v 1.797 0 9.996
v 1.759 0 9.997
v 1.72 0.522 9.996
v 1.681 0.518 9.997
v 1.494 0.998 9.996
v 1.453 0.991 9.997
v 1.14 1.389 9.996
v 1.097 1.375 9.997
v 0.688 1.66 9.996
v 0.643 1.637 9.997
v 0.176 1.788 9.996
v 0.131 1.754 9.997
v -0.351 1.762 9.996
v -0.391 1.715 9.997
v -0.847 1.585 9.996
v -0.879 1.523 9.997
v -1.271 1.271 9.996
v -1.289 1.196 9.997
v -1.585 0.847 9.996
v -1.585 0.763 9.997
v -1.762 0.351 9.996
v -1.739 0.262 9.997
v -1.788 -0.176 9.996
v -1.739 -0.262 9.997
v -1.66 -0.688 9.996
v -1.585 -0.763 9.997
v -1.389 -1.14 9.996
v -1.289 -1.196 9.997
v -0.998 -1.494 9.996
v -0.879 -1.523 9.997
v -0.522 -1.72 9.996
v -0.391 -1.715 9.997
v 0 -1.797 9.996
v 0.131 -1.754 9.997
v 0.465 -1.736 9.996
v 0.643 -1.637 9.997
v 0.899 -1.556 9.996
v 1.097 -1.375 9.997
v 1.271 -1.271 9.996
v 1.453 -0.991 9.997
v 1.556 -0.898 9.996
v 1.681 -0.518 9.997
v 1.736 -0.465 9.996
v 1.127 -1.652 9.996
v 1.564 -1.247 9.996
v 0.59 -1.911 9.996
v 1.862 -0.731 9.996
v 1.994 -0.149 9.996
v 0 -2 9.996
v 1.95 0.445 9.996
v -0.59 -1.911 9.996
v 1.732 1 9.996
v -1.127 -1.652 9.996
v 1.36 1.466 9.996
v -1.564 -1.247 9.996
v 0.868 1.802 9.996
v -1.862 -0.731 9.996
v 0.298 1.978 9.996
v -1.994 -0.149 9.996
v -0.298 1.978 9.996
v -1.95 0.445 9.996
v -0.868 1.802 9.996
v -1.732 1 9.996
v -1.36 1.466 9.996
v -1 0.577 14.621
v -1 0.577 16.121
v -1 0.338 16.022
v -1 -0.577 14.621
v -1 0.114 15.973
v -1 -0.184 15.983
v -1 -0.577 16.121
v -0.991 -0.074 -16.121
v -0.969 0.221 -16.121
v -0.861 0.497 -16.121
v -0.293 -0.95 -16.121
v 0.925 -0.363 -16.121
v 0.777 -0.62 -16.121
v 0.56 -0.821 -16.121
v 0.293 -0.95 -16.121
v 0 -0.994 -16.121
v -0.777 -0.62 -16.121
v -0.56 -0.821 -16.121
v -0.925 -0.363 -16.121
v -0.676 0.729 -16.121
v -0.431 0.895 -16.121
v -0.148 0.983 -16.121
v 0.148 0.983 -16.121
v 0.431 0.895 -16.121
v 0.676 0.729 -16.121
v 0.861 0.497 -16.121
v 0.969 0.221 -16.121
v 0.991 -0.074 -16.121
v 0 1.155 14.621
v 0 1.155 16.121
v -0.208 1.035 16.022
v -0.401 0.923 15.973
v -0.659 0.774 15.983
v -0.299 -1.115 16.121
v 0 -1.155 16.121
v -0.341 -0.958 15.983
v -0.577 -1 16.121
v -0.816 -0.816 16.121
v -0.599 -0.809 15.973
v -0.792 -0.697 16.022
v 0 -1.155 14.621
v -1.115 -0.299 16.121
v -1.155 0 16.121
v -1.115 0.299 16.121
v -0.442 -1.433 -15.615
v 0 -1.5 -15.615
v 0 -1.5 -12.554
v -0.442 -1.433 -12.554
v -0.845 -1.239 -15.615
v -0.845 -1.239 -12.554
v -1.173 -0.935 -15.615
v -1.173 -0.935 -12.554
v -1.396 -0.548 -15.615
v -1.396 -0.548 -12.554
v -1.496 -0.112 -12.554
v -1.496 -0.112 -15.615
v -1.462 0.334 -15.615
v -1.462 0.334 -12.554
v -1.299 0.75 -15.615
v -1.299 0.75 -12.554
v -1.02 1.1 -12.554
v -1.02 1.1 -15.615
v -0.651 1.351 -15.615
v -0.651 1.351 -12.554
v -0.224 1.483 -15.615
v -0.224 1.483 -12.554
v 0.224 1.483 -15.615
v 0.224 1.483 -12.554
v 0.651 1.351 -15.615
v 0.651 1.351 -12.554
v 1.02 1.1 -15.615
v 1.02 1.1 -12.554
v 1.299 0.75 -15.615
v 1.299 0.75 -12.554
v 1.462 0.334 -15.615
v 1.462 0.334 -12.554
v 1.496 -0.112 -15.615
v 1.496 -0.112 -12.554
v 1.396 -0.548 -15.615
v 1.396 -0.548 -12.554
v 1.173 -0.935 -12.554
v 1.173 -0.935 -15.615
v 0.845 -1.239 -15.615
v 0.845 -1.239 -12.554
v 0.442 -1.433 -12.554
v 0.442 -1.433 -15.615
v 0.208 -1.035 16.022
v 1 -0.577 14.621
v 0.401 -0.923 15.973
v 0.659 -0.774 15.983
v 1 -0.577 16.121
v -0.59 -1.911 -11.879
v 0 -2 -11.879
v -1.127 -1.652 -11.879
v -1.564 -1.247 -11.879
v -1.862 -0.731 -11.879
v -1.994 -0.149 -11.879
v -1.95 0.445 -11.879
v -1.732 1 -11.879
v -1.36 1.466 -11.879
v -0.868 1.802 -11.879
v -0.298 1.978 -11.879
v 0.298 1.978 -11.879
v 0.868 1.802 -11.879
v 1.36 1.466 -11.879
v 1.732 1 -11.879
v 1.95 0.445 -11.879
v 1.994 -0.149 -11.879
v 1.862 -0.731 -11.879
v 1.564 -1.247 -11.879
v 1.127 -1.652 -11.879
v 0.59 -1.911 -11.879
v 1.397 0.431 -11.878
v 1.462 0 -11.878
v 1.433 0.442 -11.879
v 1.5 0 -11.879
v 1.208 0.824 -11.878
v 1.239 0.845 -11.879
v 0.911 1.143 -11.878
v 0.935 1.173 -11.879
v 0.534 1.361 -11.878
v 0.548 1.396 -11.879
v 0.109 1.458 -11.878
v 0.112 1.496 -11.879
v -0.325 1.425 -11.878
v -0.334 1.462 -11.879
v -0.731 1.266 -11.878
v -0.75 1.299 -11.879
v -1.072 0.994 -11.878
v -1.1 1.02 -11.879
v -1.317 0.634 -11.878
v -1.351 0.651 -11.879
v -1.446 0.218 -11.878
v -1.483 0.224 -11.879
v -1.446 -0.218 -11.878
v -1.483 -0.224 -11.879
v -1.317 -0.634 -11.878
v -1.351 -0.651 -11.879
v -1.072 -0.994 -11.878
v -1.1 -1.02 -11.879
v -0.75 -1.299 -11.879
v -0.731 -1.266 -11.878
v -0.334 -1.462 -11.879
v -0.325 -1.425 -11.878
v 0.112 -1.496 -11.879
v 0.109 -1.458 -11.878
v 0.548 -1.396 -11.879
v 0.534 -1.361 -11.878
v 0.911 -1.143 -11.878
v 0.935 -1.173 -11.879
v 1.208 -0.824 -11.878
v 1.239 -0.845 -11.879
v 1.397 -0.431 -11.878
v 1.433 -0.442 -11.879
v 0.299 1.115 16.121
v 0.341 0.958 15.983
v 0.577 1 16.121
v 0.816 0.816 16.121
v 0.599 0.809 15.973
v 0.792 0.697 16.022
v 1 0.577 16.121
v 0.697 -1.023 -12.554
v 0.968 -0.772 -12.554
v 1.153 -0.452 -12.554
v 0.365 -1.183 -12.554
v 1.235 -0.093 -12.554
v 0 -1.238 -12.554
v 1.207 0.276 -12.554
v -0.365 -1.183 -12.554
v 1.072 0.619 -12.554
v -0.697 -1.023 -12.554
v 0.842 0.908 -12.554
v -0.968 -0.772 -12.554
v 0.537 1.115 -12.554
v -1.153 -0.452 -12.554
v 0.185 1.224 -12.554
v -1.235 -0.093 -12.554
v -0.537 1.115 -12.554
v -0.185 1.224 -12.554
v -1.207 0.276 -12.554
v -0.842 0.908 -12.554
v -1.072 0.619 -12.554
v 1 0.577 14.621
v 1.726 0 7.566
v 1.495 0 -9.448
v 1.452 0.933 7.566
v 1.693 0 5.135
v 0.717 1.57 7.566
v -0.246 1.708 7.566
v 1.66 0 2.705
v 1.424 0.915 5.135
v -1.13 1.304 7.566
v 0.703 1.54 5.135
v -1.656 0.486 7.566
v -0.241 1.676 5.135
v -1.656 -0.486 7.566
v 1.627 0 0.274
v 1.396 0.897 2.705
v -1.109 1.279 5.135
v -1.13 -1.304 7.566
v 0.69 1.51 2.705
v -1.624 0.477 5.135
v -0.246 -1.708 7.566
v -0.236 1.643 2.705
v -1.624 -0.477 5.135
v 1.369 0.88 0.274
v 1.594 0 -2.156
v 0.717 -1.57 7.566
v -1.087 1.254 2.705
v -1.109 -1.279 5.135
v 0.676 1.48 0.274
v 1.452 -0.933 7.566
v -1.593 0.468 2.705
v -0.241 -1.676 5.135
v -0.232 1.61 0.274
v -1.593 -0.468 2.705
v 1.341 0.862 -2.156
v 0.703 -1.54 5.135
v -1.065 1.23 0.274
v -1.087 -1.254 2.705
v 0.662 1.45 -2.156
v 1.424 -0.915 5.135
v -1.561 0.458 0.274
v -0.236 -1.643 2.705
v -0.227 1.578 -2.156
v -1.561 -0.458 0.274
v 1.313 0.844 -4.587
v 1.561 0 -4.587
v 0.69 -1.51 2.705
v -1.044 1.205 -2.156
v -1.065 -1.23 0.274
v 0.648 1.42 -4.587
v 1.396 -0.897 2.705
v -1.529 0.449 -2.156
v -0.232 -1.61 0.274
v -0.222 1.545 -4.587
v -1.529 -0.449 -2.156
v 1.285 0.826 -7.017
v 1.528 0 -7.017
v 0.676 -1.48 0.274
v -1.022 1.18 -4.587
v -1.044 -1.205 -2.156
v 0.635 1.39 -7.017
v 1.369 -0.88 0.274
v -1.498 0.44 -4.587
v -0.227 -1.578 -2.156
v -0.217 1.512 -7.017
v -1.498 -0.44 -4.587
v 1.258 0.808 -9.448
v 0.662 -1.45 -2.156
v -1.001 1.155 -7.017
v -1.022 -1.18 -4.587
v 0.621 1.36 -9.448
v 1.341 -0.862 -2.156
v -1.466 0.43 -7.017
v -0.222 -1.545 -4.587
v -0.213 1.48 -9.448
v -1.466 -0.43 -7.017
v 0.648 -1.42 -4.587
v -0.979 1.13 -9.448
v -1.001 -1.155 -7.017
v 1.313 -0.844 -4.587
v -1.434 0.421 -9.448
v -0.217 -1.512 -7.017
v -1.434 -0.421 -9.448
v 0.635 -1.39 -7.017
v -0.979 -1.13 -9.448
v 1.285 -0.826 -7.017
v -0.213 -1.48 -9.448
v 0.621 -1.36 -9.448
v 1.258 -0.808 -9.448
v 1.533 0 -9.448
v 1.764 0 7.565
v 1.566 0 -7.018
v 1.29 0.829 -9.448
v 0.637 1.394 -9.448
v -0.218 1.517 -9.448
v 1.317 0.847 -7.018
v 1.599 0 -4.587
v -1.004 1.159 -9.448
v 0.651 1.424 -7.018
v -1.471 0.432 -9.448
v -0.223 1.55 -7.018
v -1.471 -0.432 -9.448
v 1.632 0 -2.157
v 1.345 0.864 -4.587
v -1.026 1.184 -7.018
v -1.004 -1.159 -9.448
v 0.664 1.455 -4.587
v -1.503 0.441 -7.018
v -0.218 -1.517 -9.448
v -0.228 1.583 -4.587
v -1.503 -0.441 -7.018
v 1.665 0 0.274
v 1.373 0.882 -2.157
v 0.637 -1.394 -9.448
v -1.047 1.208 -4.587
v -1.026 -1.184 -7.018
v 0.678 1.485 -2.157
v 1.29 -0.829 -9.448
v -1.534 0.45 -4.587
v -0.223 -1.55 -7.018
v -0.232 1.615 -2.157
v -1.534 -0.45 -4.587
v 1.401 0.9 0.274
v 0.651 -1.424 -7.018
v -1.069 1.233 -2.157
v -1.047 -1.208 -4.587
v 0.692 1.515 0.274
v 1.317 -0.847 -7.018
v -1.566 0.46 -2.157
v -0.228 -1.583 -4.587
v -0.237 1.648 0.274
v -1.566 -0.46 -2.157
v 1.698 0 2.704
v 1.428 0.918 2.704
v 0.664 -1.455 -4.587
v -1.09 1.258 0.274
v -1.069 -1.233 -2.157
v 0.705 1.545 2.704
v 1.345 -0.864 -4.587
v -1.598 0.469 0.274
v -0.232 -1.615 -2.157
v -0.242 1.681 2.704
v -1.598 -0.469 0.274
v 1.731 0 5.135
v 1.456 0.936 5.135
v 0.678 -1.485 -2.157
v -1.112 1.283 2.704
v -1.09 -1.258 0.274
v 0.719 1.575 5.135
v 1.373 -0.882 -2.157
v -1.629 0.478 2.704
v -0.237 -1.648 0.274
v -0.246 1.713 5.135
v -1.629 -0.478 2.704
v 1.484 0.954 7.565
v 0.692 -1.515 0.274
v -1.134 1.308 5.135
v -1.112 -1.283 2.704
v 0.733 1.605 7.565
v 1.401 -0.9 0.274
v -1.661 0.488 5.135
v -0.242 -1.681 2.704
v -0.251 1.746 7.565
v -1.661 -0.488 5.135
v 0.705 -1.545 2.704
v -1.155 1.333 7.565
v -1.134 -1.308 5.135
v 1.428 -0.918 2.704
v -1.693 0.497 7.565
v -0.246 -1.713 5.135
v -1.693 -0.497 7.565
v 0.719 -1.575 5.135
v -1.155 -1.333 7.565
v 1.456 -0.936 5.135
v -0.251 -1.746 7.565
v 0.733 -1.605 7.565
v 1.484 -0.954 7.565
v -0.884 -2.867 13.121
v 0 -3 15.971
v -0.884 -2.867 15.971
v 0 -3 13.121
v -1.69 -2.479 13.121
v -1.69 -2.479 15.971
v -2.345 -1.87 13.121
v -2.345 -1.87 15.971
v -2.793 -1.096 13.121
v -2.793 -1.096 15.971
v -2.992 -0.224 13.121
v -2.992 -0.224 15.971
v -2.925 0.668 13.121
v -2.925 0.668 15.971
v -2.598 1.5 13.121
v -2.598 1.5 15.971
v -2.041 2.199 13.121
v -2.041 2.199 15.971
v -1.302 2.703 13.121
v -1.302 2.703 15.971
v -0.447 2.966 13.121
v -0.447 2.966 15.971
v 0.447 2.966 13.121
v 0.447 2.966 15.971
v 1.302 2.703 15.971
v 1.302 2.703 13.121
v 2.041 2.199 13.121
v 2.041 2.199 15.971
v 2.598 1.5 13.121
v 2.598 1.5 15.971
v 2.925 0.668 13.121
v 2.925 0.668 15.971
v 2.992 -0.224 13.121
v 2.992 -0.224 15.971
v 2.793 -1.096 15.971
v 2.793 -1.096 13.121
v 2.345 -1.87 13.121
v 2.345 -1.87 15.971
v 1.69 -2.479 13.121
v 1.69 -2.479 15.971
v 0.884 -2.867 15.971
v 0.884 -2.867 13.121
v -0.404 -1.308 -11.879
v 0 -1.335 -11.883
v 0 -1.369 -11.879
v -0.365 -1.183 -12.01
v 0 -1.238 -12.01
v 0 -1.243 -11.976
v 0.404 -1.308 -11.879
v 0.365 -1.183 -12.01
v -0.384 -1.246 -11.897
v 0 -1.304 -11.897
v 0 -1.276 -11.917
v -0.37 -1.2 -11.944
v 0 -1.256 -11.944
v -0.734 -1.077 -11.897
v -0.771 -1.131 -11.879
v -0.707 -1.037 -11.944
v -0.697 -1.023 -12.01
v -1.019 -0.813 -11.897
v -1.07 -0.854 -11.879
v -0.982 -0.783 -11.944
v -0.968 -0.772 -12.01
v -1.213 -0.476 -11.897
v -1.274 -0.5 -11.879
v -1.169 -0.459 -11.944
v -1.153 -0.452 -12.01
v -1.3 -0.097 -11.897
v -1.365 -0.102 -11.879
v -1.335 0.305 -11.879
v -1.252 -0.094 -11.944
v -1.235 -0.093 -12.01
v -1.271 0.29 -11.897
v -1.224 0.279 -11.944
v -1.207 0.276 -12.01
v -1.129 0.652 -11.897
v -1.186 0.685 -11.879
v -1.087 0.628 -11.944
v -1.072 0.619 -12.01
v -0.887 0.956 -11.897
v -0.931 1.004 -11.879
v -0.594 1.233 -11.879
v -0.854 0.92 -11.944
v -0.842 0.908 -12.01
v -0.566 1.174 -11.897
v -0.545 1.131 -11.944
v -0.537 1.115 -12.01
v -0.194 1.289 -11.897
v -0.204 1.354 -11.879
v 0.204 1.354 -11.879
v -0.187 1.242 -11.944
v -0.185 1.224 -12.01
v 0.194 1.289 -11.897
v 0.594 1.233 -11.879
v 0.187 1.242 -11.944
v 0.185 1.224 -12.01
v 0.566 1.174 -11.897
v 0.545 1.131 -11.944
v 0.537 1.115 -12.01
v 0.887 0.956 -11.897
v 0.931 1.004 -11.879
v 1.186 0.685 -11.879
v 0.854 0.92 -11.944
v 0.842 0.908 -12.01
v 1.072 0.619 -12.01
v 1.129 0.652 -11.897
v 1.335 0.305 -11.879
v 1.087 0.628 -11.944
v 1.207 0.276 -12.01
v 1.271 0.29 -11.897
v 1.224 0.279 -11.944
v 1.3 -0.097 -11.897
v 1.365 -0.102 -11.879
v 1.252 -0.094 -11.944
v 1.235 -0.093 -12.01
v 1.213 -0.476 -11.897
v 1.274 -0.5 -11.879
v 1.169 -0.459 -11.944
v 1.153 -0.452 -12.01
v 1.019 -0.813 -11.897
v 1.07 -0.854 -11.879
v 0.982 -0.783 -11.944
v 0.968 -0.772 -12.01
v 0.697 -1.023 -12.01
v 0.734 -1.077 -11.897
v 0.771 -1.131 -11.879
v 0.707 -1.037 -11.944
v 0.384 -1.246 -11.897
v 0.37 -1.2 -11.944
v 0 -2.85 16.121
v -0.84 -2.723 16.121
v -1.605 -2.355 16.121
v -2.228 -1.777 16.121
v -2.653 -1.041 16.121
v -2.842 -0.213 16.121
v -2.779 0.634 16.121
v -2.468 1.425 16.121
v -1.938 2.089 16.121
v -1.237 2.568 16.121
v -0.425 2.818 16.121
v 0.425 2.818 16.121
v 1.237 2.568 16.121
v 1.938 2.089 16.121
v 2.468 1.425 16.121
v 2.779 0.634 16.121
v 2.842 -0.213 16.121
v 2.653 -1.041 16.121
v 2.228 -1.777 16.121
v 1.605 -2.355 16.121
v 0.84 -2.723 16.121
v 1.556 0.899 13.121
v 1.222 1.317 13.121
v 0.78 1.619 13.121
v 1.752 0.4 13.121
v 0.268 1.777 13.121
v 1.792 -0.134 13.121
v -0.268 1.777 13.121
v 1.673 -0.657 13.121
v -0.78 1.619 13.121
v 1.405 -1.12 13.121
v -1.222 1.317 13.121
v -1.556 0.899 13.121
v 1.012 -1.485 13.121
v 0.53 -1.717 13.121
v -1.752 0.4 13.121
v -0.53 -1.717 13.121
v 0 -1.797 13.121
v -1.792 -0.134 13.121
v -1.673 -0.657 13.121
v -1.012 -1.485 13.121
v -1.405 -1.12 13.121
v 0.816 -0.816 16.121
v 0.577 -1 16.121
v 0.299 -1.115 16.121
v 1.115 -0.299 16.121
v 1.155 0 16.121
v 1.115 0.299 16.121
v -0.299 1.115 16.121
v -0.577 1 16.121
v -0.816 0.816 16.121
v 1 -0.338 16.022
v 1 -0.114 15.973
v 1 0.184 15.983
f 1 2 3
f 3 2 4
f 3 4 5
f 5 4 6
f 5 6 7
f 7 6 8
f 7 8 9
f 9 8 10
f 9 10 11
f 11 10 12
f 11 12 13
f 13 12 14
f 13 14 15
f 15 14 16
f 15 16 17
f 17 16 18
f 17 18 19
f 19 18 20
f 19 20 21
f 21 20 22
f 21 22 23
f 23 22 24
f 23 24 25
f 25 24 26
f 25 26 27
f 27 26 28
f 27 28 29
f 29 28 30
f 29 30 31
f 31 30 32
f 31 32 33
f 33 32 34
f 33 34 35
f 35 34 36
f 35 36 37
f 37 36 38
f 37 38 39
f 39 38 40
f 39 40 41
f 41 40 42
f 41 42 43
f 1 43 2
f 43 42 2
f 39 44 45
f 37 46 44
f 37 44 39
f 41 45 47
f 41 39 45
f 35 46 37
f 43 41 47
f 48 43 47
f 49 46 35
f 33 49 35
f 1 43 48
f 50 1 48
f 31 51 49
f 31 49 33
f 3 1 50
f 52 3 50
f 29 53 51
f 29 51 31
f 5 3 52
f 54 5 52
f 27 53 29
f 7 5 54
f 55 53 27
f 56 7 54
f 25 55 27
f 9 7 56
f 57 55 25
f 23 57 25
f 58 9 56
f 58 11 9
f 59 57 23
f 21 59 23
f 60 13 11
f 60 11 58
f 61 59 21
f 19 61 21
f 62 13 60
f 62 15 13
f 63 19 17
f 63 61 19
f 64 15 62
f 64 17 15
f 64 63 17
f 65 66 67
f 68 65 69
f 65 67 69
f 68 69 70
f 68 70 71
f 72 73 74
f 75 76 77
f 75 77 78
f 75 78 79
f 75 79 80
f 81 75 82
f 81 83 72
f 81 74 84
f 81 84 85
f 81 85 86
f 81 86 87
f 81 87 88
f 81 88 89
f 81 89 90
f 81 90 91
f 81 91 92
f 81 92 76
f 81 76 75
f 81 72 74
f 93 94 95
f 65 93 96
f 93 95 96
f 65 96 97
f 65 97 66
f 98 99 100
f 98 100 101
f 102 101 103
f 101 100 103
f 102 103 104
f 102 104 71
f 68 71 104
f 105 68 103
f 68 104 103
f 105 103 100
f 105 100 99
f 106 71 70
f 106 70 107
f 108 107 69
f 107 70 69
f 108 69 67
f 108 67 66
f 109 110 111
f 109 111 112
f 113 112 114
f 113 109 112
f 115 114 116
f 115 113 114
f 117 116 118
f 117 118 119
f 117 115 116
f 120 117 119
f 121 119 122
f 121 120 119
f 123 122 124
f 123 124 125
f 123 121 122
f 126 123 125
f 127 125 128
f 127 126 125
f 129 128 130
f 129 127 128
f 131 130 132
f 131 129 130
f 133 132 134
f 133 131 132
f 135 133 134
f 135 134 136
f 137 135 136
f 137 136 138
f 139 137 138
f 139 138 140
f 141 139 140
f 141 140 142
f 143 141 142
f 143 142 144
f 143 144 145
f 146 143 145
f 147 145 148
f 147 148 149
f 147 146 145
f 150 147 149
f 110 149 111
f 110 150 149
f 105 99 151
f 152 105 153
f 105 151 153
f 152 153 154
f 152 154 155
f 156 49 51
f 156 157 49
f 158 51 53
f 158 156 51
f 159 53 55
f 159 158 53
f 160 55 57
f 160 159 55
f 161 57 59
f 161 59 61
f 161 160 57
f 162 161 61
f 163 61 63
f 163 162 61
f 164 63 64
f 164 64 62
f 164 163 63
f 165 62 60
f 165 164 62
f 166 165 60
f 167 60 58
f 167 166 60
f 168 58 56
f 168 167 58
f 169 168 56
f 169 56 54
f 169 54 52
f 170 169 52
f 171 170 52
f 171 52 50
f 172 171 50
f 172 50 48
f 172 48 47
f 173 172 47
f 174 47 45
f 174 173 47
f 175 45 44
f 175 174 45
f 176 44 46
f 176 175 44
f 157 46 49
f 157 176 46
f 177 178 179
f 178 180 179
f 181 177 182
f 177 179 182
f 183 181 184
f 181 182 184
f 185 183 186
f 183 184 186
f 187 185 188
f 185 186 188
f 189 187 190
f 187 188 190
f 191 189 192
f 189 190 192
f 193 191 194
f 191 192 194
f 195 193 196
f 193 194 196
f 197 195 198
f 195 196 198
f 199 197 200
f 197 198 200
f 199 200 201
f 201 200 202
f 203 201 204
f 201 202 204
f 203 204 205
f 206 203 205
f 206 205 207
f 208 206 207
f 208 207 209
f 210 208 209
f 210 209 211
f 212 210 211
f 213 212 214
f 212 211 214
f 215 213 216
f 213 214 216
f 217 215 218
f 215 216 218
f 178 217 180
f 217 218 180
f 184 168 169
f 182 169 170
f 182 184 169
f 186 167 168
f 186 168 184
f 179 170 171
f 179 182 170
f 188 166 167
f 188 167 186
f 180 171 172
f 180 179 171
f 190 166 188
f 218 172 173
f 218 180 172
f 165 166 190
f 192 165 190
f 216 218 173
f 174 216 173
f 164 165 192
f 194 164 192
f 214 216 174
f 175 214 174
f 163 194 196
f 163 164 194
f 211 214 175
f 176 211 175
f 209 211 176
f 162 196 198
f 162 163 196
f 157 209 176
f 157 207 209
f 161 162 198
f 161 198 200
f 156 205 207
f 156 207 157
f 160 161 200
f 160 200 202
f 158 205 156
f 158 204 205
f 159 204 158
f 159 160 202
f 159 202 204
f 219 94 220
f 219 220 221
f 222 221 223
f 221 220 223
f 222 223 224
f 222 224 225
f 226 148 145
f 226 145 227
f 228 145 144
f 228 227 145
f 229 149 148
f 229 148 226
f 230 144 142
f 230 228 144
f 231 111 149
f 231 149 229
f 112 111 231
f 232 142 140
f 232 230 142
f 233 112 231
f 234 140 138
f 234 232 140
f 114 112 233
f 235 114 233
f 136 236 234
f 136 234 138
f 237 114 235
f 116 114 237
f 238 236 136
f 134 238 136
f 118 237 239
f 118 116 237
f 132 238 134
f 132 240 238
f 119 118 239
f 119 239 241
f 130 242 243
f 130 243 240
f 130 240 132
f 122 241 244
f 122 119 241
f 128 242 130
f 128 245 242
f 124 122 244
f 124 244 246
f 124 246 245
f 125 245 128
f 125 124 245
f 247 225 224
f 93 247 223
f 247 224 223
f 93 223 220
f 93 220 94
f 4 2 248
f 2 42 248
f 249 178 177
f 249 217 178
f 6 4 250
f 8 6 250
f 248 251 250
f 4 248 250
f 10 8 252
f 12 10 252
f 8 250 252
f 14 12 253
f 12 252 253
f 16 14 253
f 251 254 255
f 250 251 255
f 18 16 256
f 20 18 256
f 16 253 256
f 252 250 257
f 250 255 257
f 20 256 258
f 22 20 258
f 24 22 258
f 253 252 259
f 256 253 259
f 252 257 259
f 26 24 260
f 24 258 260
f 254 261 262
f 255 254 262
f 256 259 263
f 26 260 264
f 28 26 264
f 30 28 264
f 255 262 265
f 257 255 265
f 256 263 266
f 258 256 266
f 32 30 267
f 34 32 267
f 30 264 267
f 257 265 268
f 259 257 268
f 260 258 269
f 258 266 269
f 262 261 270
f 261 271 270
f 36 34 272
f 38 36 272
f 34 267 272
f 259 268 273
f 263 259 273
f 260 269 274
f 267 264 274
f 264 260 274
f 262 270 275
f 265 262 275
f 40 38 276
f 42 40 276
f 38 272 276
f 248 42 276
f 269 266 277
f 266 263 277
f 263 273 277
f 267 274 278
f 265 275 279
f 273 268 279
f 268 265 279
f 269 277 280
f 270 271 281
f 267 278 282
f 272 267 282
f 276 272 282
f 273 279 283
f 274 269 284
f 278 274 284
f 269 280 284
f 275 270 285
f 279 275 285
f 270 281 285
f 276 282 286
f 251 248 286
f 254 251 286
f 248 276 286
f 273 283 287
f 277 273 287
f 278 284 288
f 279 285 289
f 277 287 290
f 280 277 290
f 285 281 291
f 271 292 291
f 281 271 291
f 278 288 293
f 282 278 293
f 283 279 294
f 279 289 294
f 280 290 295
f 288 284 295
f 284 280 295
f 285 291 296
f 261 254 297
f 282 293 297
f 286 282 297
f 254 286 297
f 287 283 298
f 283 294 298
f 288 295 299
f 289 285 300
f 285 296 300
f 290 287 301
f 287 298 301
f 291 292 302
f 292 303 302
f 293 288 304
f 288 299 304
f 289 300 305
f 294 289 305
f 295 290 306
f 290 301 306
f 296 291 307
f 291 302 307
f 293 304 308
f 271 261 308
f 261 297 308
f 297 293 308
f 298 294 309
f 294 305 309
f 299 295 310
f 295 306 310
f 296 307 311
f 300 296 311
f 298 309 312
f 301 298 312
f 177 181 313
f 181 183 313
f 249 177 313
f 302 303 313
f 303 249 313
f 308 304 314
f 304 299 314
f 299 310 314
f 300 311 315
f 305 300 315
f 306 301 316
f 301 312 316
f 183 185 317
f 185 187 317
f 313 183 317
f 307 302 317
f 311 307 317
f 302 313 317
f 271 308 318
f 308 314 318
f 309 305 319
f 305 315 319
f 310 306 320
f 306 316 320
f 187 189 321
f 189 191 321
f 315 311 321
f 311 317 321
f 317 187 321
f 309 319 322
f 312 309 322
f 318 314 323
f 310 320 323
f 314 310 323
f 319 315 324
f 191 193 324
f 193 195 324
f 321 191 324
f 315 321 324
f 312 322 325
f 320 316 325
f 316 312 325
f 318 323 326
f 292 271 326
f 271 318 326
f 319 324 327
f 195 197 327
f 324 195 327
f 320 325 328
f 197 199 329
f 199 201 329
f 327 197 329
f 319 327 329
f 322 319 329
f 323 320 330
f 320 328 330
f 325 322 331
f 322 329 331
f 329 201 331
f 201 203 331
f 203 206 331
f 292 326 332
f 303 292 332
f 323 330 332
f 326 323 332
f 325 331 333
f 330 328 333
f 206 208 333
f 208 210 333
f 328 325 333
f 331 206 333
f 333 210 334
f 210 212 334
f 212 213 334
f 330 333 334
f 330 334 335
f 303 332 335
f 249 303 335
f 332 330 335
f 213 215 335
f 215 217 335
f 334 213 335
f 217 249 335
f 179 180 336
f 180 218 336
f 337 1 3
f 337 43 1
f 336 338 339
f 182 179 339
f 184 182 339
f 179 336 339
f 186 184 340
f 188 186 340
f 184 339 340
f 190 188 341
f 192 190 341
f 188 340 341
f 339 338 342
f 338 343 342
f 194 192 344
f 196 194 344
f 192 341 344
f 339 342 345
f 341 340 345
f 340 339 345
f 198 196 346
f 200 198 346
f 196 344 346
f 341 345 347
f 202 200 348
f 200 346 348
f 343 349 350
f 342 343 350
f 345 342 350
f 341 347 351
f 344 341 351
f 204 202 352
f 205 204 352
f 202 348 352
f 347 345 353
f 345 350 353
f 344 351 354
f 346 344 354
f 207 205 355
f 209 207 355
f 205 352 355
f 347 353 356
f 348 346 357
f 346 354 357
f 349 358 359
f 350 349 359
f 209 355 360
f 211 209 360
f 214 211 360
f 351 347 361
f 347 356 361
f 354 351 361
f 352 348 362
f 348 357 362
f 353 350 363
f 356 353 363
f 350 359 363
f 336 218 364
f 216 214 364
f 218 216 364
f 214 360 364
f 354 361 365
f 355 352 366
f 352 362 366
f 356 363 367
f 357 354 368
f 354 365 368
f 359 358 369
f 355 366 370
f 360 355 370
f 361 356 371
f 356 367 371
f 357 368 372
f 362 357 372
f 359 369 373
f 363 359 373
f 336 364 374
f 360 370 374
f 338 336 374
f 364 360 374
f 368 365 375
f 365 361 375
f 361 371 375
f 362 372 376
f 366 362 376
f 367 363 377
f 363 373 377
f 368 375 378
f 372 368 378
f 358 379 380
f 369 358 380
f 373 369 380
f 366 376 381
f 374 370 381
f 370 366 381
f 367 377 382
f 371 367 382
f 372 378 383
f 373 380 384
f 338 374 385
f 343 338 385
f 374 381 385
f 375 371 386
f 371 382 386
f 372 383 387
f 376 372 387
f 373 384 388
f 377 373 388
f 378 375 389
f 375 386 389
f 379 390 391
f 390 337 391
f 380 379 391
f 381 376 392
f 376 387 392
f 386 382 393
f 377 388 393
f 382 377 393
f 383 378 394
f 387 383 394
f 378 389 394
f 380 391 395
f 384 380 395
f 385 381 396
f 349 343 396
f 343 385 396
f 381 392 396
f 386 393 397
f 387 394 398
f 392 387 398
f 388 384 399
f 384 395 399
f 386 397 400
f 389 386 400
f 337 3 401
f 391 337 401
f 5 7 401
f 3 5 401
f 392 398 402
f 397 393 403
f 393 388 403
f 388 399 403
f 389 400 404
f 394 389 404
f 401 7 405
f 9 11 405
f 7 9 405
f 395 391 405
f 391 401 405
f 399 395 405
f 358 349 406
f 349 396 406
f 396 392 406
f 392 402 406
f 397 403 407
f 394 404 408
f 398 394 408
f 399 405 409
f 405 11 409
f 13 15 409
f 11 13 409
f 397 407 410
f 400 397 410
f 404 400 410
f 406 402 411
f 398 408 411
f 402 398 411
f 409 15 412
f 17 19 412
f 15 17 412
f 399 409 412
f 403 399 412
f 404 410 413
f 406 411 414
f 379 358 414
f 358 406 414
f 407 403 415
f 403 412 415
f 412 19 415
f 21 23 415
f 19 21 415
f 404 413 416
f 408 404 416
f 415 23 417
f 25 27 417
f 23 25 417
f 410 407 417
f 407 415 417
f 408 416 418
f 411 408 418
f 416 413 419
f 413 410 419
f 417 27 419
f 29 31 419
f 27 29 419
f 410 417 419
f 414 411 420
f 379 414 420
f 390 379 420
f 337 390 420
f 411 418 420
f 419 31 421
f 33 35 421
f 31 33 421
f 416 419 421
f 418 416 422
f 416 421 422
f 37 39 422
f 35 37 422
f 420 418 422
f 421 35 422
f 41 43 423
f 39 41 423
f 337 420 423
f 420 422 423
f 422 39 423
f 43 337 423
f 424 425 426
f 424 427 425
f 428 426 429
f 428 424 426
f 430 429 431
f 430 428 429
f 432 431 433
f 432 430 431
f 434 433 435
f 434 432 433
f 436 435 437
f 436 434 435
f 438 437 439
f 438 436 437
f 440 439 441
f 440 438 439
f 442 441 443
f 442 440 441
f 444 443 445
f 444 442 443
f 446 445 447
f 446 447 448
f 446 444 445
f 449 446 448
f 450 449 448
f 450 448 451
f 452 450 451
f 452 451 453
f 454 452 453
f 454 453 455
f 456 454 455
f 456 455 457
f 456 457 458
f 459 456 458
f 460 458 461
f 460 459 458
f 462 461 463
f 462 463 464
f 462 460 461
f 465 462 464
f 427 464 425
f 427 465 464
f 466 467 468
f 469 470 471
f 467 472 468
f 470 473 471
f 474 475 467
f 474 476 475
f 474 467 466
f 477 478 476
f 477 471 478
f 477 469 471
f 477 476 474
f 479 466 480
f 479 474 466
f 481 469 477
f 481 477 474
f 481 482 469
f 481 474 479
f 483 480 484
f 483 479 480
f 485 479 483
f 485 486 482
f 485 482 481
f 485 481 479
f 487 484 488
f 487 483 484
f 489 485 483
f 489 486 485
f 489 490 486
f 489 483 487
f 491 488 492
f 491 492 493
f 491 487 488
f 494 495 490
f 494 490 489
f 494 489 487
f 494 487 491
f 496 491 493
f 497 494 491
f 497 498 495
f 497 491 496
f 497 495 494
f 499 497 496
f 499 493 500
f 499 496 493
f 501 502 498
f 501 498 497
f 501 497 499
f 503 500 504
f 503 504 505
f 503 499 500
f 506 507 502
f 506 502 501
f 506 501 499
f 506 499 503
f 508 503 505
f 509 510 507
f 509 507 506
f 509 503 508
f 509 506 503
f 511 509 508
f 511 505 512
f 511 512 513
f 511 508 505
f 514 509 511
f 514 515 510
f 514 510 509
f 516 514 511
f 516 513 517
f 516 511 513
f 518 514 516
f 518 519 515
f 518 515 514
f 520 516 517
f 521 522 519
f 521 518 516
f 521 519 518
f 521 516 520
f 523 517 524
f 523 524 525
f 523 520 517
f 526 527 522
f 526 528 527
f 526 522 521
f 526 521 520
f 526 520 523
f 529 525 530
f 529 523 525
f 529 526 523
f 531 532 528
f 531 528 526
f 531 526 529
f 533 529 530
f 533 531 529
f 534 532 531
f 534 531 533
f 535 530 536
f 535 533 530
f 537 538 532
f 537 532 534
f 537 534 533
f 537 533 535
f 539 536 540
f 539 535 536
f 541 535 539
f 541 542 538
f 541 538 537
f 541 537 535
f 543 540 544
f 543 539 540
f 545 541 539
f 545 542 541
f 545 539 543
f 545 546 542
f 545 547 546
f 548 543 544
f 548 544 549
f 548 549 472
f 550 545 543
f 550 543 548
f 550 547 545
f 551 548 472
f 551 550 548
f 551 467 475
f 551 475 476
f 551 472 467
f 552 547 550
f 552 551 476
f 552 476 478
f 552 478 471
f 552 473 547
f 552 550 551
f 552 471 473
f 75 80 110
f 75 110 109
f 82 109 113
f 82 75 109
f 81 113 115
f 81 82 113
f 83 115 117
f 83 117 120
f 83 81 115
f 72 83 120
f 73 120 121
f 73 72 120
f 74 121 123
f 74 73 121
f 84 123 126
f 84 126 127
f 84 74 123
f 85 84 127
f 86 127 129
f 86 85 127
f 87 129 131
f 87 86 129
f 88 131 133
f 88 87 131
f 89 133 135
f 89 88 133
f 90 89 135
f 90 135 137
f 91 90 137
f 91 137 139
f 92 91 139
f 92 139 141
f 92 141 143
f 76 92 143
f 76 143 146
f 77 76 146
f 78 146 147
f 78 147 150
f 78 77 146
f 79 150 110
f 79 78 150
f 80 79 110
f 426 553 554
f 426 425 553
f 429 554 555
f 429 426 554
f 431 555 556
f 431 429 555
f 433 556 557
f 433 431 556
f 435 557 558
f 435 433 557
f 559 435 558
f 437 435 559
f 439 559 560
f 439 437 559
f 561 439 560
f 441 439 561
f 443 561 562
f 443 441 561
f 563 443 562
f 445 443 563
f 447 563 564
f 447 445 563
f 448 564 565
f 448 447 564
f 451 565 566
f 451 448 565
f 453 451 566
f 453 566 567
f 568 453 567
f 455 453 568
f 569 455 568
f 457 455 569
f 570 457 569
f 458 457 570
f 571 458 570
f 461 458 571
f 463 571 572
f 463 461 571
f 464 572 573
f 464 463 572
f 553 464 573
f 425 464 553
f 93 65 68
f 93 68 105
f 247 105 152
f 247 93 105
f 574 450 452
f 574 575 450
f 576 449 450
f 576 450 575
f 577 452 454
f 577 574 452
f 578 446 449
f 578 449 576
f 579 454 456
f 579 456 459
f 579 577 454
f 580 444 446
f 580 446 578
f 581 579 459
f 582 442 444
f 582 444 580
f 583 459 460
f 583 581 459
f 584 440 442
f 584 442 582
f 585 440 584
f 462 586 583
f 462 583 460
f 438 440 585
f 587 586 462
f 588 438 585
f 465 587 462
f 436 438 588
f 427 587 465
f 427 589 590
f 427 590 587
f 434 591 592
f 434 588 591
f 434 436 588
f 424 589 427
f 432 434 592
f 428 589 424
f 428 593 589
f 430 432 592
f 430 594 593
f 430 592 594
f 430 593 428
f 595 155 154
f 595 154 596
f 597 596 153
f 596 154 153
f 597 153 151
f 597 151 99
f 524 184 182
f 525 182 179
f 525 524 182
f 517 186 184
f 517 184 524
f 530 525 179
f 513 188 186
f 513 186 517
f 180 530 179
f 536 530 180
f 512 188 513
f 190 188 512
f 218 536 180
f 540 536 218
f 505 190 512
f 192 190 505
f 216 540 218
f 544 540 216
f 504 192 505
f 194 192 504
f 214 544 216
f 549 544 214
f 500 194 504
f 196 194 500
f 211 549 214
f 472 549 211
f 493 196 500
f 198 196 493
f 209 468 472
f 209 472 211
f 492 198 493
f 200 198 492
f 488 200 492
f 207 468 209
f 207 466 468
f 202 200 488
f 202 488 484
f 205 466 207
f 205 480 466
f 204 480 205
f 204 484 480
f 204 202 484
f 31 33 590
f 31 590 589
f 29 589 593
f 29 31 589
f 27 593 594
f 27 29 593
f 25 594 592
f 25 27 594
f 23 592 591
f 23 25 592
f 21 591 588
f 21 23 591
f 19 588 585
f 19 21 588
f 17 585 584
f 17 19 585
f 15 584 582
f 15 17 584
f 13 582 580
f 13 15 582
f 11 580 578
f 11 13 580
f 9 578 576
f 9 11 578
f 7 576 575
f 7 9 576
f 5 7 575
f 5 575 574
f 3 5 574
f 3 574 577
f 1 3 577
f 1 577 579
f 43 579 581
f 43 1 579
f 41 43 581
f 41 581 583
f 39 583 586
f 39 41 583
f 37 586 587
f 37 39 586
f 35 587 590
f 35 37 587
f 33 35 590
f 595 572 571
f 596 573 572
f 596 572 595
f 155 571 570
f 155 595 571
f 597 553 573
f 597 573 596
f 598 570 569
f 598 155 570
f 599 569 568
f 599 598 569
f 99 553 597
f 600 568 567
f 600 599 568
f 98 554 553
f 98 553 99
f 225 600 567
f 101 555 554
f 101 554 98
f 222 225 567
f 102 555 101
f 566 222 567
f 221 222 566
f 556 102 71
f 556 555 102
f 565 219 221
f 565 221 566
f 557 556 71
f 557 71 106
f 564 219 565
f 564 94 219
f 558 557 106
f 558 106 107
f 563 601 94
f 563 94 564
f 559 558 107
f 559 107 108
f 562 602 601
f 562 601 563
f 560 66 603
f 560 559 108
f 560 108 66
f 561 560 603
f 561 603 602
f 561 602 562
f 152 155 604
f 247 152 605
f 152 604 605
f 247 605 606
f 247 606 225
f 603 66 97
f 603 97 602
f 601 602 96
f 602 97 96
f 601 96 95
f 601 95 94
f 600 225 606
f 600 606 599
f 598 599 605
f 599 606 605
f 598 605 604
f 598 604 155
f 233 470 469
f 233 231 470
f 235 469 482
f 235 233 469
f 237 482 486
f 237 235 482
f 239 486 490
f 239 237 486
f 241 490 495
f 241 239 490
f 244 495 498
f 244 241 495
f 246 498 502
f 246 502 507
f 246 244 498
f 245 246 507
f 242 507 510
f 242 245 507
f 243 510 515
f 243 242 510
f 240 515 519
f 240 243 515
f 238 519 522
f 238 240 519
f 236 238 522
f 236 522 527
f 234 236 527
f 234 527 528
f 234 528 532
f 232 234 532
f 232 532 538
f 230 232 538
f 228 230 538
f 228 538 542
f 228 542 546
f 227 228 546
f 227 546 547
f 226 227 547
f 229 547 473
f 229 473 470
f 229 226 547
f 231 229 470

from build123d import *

# Parameters (mm, degrees)
CUT_EXTRUDE1_START = 16.121
CUT_EXTRUDE1_DEPTH = 1.5
CHAMFER2_SIZE      = 0.506148016


# Read off the part's stored shape, not the designer's step: Cut-Revolve-Thin1
with BuildPart() as part:
    # Sketch3 → Revolve1 (revolve)
    with BuildSketch(Plane(origin=(0, 0, 0), x_dir=(0, 0, -1), z_dir=(1, 0, 0)), mode=Mode.PRIVATE) as revolve1_sk:
        with BuildLine():
            Line((-16.121, 0), (-16.121, 2.805))
            Line((-16.121, 2.805), (-16.121, 3))
            Line((-16.121, 3), (-13.316, 3))
            Line((-13.316, 3), (-13.121, 3))
            Line((-13.121, 3), (-13.121, 1.797))
            Line((-13.121, 1.797), (-9.996, 1.797))
            Line((-9.996, 1.797), (-9.996, 2))
            Line((-9.996, 2), (11.879, 2))
            Line((11.879, 2), (11.879, 1.36904775))
            ThreePointArc((11.879, 1.36904775), (11.917355026, 1.276450526), (12.00995225, 1.2380955))
            Line((12.00995225, 1.2380955), (12.553864022, 1.2380955))
            Line((12.553864022, 1.2380955), (12.553864022, 1.5))
            Line((12.553864022, 1.5), (15.746, 1.5))
            Line((15.746, 1.5), (16.121, 1.5))
            Line((16.121, 1.5), (16.121, 0))
            Line((16.121, 0), (-16.121, 0))
        make_face()
    revolve(revolve1_sk.sketch.rotate(Axis((0, 0, 16.121), (0, 0, -1)), 180), axis=Axis((0, 0, 16.121), (0, 0, -1)))

    # Cut-Revolve-Thin1 outline → Cut-Revolve-Thin1 (revolve, cut)
    with BuildSketch(Plane.XZ):
        Polygon((1.758903511, 9.996517241), (1.461903511, -11.878482759), (1.5, -11.879), (1.797, 9.996), align=None)
    revolve(axis=Axis((0, 0, 0), (0, 0, 1)), mode=Mode.SUBTRACT)

    # Sketch4 → Cut-Extrude1 (cut)
    with BuildSketch(Plane.XY.offset(CUT_EXTRUDE1_START)):
        Polygon((0, 1.154700538), (-1, 0.577350269), (-1, -0.577350269), (0, -1.154700538), (1, -0.577350269), (1, 0.577350269), align=None)
    extrude(amount=-CUT_EXTRUDE1_DEPTH, mode=Mode.SUBTRACT)

    # Cut-Extrude2 cone 1 section (through the dimple's axis) → Cut-Extrude2 (revolve, cut)
    with BuildSketch(Plane(origin=(0, 0, 16.121), x_dir=(0, -1, 0), z_dir=(1, 0, 0))):
        Polygon((0, 0), (1.154700538, 0), (0, 1.154700538), align=None)
    revolve(axis=Axis((0, 0, 16.121), (0, 0, -1)), mode=Mode.SUBTRACT)

    # Chamfer2
    chamfer2_edges = [part.edges().sort_by_distance(p)[0] for p in [
        (0, 1.5, -16.121),
    ]]
    chamfer(chamfer2_edges, length=CHAMFER2_SIZE)

    # Sketch10 → Cut-Revolve2 (revolve, cut)
    with BuildSketch(Plane(origin=(0, 0, 0), x_dir=(0, 0, -1), z_dir=(1, 0, 0)), mode=Mode.PRIVATE) as cut_revolve2_sk:
        Polygon((-16.121, 2.85), (-15.971, 3), (-16.121, 3), align=None)
    revolve(cut_revolve2_sk.sketch.rotate(Axis((0, 0, 16.121), (0, 0, -1)), 180), axis=Axis((0, 0, 16.121), (0, 0, -1)), mode=Mode.SUBTRACT)


solid = part.part
